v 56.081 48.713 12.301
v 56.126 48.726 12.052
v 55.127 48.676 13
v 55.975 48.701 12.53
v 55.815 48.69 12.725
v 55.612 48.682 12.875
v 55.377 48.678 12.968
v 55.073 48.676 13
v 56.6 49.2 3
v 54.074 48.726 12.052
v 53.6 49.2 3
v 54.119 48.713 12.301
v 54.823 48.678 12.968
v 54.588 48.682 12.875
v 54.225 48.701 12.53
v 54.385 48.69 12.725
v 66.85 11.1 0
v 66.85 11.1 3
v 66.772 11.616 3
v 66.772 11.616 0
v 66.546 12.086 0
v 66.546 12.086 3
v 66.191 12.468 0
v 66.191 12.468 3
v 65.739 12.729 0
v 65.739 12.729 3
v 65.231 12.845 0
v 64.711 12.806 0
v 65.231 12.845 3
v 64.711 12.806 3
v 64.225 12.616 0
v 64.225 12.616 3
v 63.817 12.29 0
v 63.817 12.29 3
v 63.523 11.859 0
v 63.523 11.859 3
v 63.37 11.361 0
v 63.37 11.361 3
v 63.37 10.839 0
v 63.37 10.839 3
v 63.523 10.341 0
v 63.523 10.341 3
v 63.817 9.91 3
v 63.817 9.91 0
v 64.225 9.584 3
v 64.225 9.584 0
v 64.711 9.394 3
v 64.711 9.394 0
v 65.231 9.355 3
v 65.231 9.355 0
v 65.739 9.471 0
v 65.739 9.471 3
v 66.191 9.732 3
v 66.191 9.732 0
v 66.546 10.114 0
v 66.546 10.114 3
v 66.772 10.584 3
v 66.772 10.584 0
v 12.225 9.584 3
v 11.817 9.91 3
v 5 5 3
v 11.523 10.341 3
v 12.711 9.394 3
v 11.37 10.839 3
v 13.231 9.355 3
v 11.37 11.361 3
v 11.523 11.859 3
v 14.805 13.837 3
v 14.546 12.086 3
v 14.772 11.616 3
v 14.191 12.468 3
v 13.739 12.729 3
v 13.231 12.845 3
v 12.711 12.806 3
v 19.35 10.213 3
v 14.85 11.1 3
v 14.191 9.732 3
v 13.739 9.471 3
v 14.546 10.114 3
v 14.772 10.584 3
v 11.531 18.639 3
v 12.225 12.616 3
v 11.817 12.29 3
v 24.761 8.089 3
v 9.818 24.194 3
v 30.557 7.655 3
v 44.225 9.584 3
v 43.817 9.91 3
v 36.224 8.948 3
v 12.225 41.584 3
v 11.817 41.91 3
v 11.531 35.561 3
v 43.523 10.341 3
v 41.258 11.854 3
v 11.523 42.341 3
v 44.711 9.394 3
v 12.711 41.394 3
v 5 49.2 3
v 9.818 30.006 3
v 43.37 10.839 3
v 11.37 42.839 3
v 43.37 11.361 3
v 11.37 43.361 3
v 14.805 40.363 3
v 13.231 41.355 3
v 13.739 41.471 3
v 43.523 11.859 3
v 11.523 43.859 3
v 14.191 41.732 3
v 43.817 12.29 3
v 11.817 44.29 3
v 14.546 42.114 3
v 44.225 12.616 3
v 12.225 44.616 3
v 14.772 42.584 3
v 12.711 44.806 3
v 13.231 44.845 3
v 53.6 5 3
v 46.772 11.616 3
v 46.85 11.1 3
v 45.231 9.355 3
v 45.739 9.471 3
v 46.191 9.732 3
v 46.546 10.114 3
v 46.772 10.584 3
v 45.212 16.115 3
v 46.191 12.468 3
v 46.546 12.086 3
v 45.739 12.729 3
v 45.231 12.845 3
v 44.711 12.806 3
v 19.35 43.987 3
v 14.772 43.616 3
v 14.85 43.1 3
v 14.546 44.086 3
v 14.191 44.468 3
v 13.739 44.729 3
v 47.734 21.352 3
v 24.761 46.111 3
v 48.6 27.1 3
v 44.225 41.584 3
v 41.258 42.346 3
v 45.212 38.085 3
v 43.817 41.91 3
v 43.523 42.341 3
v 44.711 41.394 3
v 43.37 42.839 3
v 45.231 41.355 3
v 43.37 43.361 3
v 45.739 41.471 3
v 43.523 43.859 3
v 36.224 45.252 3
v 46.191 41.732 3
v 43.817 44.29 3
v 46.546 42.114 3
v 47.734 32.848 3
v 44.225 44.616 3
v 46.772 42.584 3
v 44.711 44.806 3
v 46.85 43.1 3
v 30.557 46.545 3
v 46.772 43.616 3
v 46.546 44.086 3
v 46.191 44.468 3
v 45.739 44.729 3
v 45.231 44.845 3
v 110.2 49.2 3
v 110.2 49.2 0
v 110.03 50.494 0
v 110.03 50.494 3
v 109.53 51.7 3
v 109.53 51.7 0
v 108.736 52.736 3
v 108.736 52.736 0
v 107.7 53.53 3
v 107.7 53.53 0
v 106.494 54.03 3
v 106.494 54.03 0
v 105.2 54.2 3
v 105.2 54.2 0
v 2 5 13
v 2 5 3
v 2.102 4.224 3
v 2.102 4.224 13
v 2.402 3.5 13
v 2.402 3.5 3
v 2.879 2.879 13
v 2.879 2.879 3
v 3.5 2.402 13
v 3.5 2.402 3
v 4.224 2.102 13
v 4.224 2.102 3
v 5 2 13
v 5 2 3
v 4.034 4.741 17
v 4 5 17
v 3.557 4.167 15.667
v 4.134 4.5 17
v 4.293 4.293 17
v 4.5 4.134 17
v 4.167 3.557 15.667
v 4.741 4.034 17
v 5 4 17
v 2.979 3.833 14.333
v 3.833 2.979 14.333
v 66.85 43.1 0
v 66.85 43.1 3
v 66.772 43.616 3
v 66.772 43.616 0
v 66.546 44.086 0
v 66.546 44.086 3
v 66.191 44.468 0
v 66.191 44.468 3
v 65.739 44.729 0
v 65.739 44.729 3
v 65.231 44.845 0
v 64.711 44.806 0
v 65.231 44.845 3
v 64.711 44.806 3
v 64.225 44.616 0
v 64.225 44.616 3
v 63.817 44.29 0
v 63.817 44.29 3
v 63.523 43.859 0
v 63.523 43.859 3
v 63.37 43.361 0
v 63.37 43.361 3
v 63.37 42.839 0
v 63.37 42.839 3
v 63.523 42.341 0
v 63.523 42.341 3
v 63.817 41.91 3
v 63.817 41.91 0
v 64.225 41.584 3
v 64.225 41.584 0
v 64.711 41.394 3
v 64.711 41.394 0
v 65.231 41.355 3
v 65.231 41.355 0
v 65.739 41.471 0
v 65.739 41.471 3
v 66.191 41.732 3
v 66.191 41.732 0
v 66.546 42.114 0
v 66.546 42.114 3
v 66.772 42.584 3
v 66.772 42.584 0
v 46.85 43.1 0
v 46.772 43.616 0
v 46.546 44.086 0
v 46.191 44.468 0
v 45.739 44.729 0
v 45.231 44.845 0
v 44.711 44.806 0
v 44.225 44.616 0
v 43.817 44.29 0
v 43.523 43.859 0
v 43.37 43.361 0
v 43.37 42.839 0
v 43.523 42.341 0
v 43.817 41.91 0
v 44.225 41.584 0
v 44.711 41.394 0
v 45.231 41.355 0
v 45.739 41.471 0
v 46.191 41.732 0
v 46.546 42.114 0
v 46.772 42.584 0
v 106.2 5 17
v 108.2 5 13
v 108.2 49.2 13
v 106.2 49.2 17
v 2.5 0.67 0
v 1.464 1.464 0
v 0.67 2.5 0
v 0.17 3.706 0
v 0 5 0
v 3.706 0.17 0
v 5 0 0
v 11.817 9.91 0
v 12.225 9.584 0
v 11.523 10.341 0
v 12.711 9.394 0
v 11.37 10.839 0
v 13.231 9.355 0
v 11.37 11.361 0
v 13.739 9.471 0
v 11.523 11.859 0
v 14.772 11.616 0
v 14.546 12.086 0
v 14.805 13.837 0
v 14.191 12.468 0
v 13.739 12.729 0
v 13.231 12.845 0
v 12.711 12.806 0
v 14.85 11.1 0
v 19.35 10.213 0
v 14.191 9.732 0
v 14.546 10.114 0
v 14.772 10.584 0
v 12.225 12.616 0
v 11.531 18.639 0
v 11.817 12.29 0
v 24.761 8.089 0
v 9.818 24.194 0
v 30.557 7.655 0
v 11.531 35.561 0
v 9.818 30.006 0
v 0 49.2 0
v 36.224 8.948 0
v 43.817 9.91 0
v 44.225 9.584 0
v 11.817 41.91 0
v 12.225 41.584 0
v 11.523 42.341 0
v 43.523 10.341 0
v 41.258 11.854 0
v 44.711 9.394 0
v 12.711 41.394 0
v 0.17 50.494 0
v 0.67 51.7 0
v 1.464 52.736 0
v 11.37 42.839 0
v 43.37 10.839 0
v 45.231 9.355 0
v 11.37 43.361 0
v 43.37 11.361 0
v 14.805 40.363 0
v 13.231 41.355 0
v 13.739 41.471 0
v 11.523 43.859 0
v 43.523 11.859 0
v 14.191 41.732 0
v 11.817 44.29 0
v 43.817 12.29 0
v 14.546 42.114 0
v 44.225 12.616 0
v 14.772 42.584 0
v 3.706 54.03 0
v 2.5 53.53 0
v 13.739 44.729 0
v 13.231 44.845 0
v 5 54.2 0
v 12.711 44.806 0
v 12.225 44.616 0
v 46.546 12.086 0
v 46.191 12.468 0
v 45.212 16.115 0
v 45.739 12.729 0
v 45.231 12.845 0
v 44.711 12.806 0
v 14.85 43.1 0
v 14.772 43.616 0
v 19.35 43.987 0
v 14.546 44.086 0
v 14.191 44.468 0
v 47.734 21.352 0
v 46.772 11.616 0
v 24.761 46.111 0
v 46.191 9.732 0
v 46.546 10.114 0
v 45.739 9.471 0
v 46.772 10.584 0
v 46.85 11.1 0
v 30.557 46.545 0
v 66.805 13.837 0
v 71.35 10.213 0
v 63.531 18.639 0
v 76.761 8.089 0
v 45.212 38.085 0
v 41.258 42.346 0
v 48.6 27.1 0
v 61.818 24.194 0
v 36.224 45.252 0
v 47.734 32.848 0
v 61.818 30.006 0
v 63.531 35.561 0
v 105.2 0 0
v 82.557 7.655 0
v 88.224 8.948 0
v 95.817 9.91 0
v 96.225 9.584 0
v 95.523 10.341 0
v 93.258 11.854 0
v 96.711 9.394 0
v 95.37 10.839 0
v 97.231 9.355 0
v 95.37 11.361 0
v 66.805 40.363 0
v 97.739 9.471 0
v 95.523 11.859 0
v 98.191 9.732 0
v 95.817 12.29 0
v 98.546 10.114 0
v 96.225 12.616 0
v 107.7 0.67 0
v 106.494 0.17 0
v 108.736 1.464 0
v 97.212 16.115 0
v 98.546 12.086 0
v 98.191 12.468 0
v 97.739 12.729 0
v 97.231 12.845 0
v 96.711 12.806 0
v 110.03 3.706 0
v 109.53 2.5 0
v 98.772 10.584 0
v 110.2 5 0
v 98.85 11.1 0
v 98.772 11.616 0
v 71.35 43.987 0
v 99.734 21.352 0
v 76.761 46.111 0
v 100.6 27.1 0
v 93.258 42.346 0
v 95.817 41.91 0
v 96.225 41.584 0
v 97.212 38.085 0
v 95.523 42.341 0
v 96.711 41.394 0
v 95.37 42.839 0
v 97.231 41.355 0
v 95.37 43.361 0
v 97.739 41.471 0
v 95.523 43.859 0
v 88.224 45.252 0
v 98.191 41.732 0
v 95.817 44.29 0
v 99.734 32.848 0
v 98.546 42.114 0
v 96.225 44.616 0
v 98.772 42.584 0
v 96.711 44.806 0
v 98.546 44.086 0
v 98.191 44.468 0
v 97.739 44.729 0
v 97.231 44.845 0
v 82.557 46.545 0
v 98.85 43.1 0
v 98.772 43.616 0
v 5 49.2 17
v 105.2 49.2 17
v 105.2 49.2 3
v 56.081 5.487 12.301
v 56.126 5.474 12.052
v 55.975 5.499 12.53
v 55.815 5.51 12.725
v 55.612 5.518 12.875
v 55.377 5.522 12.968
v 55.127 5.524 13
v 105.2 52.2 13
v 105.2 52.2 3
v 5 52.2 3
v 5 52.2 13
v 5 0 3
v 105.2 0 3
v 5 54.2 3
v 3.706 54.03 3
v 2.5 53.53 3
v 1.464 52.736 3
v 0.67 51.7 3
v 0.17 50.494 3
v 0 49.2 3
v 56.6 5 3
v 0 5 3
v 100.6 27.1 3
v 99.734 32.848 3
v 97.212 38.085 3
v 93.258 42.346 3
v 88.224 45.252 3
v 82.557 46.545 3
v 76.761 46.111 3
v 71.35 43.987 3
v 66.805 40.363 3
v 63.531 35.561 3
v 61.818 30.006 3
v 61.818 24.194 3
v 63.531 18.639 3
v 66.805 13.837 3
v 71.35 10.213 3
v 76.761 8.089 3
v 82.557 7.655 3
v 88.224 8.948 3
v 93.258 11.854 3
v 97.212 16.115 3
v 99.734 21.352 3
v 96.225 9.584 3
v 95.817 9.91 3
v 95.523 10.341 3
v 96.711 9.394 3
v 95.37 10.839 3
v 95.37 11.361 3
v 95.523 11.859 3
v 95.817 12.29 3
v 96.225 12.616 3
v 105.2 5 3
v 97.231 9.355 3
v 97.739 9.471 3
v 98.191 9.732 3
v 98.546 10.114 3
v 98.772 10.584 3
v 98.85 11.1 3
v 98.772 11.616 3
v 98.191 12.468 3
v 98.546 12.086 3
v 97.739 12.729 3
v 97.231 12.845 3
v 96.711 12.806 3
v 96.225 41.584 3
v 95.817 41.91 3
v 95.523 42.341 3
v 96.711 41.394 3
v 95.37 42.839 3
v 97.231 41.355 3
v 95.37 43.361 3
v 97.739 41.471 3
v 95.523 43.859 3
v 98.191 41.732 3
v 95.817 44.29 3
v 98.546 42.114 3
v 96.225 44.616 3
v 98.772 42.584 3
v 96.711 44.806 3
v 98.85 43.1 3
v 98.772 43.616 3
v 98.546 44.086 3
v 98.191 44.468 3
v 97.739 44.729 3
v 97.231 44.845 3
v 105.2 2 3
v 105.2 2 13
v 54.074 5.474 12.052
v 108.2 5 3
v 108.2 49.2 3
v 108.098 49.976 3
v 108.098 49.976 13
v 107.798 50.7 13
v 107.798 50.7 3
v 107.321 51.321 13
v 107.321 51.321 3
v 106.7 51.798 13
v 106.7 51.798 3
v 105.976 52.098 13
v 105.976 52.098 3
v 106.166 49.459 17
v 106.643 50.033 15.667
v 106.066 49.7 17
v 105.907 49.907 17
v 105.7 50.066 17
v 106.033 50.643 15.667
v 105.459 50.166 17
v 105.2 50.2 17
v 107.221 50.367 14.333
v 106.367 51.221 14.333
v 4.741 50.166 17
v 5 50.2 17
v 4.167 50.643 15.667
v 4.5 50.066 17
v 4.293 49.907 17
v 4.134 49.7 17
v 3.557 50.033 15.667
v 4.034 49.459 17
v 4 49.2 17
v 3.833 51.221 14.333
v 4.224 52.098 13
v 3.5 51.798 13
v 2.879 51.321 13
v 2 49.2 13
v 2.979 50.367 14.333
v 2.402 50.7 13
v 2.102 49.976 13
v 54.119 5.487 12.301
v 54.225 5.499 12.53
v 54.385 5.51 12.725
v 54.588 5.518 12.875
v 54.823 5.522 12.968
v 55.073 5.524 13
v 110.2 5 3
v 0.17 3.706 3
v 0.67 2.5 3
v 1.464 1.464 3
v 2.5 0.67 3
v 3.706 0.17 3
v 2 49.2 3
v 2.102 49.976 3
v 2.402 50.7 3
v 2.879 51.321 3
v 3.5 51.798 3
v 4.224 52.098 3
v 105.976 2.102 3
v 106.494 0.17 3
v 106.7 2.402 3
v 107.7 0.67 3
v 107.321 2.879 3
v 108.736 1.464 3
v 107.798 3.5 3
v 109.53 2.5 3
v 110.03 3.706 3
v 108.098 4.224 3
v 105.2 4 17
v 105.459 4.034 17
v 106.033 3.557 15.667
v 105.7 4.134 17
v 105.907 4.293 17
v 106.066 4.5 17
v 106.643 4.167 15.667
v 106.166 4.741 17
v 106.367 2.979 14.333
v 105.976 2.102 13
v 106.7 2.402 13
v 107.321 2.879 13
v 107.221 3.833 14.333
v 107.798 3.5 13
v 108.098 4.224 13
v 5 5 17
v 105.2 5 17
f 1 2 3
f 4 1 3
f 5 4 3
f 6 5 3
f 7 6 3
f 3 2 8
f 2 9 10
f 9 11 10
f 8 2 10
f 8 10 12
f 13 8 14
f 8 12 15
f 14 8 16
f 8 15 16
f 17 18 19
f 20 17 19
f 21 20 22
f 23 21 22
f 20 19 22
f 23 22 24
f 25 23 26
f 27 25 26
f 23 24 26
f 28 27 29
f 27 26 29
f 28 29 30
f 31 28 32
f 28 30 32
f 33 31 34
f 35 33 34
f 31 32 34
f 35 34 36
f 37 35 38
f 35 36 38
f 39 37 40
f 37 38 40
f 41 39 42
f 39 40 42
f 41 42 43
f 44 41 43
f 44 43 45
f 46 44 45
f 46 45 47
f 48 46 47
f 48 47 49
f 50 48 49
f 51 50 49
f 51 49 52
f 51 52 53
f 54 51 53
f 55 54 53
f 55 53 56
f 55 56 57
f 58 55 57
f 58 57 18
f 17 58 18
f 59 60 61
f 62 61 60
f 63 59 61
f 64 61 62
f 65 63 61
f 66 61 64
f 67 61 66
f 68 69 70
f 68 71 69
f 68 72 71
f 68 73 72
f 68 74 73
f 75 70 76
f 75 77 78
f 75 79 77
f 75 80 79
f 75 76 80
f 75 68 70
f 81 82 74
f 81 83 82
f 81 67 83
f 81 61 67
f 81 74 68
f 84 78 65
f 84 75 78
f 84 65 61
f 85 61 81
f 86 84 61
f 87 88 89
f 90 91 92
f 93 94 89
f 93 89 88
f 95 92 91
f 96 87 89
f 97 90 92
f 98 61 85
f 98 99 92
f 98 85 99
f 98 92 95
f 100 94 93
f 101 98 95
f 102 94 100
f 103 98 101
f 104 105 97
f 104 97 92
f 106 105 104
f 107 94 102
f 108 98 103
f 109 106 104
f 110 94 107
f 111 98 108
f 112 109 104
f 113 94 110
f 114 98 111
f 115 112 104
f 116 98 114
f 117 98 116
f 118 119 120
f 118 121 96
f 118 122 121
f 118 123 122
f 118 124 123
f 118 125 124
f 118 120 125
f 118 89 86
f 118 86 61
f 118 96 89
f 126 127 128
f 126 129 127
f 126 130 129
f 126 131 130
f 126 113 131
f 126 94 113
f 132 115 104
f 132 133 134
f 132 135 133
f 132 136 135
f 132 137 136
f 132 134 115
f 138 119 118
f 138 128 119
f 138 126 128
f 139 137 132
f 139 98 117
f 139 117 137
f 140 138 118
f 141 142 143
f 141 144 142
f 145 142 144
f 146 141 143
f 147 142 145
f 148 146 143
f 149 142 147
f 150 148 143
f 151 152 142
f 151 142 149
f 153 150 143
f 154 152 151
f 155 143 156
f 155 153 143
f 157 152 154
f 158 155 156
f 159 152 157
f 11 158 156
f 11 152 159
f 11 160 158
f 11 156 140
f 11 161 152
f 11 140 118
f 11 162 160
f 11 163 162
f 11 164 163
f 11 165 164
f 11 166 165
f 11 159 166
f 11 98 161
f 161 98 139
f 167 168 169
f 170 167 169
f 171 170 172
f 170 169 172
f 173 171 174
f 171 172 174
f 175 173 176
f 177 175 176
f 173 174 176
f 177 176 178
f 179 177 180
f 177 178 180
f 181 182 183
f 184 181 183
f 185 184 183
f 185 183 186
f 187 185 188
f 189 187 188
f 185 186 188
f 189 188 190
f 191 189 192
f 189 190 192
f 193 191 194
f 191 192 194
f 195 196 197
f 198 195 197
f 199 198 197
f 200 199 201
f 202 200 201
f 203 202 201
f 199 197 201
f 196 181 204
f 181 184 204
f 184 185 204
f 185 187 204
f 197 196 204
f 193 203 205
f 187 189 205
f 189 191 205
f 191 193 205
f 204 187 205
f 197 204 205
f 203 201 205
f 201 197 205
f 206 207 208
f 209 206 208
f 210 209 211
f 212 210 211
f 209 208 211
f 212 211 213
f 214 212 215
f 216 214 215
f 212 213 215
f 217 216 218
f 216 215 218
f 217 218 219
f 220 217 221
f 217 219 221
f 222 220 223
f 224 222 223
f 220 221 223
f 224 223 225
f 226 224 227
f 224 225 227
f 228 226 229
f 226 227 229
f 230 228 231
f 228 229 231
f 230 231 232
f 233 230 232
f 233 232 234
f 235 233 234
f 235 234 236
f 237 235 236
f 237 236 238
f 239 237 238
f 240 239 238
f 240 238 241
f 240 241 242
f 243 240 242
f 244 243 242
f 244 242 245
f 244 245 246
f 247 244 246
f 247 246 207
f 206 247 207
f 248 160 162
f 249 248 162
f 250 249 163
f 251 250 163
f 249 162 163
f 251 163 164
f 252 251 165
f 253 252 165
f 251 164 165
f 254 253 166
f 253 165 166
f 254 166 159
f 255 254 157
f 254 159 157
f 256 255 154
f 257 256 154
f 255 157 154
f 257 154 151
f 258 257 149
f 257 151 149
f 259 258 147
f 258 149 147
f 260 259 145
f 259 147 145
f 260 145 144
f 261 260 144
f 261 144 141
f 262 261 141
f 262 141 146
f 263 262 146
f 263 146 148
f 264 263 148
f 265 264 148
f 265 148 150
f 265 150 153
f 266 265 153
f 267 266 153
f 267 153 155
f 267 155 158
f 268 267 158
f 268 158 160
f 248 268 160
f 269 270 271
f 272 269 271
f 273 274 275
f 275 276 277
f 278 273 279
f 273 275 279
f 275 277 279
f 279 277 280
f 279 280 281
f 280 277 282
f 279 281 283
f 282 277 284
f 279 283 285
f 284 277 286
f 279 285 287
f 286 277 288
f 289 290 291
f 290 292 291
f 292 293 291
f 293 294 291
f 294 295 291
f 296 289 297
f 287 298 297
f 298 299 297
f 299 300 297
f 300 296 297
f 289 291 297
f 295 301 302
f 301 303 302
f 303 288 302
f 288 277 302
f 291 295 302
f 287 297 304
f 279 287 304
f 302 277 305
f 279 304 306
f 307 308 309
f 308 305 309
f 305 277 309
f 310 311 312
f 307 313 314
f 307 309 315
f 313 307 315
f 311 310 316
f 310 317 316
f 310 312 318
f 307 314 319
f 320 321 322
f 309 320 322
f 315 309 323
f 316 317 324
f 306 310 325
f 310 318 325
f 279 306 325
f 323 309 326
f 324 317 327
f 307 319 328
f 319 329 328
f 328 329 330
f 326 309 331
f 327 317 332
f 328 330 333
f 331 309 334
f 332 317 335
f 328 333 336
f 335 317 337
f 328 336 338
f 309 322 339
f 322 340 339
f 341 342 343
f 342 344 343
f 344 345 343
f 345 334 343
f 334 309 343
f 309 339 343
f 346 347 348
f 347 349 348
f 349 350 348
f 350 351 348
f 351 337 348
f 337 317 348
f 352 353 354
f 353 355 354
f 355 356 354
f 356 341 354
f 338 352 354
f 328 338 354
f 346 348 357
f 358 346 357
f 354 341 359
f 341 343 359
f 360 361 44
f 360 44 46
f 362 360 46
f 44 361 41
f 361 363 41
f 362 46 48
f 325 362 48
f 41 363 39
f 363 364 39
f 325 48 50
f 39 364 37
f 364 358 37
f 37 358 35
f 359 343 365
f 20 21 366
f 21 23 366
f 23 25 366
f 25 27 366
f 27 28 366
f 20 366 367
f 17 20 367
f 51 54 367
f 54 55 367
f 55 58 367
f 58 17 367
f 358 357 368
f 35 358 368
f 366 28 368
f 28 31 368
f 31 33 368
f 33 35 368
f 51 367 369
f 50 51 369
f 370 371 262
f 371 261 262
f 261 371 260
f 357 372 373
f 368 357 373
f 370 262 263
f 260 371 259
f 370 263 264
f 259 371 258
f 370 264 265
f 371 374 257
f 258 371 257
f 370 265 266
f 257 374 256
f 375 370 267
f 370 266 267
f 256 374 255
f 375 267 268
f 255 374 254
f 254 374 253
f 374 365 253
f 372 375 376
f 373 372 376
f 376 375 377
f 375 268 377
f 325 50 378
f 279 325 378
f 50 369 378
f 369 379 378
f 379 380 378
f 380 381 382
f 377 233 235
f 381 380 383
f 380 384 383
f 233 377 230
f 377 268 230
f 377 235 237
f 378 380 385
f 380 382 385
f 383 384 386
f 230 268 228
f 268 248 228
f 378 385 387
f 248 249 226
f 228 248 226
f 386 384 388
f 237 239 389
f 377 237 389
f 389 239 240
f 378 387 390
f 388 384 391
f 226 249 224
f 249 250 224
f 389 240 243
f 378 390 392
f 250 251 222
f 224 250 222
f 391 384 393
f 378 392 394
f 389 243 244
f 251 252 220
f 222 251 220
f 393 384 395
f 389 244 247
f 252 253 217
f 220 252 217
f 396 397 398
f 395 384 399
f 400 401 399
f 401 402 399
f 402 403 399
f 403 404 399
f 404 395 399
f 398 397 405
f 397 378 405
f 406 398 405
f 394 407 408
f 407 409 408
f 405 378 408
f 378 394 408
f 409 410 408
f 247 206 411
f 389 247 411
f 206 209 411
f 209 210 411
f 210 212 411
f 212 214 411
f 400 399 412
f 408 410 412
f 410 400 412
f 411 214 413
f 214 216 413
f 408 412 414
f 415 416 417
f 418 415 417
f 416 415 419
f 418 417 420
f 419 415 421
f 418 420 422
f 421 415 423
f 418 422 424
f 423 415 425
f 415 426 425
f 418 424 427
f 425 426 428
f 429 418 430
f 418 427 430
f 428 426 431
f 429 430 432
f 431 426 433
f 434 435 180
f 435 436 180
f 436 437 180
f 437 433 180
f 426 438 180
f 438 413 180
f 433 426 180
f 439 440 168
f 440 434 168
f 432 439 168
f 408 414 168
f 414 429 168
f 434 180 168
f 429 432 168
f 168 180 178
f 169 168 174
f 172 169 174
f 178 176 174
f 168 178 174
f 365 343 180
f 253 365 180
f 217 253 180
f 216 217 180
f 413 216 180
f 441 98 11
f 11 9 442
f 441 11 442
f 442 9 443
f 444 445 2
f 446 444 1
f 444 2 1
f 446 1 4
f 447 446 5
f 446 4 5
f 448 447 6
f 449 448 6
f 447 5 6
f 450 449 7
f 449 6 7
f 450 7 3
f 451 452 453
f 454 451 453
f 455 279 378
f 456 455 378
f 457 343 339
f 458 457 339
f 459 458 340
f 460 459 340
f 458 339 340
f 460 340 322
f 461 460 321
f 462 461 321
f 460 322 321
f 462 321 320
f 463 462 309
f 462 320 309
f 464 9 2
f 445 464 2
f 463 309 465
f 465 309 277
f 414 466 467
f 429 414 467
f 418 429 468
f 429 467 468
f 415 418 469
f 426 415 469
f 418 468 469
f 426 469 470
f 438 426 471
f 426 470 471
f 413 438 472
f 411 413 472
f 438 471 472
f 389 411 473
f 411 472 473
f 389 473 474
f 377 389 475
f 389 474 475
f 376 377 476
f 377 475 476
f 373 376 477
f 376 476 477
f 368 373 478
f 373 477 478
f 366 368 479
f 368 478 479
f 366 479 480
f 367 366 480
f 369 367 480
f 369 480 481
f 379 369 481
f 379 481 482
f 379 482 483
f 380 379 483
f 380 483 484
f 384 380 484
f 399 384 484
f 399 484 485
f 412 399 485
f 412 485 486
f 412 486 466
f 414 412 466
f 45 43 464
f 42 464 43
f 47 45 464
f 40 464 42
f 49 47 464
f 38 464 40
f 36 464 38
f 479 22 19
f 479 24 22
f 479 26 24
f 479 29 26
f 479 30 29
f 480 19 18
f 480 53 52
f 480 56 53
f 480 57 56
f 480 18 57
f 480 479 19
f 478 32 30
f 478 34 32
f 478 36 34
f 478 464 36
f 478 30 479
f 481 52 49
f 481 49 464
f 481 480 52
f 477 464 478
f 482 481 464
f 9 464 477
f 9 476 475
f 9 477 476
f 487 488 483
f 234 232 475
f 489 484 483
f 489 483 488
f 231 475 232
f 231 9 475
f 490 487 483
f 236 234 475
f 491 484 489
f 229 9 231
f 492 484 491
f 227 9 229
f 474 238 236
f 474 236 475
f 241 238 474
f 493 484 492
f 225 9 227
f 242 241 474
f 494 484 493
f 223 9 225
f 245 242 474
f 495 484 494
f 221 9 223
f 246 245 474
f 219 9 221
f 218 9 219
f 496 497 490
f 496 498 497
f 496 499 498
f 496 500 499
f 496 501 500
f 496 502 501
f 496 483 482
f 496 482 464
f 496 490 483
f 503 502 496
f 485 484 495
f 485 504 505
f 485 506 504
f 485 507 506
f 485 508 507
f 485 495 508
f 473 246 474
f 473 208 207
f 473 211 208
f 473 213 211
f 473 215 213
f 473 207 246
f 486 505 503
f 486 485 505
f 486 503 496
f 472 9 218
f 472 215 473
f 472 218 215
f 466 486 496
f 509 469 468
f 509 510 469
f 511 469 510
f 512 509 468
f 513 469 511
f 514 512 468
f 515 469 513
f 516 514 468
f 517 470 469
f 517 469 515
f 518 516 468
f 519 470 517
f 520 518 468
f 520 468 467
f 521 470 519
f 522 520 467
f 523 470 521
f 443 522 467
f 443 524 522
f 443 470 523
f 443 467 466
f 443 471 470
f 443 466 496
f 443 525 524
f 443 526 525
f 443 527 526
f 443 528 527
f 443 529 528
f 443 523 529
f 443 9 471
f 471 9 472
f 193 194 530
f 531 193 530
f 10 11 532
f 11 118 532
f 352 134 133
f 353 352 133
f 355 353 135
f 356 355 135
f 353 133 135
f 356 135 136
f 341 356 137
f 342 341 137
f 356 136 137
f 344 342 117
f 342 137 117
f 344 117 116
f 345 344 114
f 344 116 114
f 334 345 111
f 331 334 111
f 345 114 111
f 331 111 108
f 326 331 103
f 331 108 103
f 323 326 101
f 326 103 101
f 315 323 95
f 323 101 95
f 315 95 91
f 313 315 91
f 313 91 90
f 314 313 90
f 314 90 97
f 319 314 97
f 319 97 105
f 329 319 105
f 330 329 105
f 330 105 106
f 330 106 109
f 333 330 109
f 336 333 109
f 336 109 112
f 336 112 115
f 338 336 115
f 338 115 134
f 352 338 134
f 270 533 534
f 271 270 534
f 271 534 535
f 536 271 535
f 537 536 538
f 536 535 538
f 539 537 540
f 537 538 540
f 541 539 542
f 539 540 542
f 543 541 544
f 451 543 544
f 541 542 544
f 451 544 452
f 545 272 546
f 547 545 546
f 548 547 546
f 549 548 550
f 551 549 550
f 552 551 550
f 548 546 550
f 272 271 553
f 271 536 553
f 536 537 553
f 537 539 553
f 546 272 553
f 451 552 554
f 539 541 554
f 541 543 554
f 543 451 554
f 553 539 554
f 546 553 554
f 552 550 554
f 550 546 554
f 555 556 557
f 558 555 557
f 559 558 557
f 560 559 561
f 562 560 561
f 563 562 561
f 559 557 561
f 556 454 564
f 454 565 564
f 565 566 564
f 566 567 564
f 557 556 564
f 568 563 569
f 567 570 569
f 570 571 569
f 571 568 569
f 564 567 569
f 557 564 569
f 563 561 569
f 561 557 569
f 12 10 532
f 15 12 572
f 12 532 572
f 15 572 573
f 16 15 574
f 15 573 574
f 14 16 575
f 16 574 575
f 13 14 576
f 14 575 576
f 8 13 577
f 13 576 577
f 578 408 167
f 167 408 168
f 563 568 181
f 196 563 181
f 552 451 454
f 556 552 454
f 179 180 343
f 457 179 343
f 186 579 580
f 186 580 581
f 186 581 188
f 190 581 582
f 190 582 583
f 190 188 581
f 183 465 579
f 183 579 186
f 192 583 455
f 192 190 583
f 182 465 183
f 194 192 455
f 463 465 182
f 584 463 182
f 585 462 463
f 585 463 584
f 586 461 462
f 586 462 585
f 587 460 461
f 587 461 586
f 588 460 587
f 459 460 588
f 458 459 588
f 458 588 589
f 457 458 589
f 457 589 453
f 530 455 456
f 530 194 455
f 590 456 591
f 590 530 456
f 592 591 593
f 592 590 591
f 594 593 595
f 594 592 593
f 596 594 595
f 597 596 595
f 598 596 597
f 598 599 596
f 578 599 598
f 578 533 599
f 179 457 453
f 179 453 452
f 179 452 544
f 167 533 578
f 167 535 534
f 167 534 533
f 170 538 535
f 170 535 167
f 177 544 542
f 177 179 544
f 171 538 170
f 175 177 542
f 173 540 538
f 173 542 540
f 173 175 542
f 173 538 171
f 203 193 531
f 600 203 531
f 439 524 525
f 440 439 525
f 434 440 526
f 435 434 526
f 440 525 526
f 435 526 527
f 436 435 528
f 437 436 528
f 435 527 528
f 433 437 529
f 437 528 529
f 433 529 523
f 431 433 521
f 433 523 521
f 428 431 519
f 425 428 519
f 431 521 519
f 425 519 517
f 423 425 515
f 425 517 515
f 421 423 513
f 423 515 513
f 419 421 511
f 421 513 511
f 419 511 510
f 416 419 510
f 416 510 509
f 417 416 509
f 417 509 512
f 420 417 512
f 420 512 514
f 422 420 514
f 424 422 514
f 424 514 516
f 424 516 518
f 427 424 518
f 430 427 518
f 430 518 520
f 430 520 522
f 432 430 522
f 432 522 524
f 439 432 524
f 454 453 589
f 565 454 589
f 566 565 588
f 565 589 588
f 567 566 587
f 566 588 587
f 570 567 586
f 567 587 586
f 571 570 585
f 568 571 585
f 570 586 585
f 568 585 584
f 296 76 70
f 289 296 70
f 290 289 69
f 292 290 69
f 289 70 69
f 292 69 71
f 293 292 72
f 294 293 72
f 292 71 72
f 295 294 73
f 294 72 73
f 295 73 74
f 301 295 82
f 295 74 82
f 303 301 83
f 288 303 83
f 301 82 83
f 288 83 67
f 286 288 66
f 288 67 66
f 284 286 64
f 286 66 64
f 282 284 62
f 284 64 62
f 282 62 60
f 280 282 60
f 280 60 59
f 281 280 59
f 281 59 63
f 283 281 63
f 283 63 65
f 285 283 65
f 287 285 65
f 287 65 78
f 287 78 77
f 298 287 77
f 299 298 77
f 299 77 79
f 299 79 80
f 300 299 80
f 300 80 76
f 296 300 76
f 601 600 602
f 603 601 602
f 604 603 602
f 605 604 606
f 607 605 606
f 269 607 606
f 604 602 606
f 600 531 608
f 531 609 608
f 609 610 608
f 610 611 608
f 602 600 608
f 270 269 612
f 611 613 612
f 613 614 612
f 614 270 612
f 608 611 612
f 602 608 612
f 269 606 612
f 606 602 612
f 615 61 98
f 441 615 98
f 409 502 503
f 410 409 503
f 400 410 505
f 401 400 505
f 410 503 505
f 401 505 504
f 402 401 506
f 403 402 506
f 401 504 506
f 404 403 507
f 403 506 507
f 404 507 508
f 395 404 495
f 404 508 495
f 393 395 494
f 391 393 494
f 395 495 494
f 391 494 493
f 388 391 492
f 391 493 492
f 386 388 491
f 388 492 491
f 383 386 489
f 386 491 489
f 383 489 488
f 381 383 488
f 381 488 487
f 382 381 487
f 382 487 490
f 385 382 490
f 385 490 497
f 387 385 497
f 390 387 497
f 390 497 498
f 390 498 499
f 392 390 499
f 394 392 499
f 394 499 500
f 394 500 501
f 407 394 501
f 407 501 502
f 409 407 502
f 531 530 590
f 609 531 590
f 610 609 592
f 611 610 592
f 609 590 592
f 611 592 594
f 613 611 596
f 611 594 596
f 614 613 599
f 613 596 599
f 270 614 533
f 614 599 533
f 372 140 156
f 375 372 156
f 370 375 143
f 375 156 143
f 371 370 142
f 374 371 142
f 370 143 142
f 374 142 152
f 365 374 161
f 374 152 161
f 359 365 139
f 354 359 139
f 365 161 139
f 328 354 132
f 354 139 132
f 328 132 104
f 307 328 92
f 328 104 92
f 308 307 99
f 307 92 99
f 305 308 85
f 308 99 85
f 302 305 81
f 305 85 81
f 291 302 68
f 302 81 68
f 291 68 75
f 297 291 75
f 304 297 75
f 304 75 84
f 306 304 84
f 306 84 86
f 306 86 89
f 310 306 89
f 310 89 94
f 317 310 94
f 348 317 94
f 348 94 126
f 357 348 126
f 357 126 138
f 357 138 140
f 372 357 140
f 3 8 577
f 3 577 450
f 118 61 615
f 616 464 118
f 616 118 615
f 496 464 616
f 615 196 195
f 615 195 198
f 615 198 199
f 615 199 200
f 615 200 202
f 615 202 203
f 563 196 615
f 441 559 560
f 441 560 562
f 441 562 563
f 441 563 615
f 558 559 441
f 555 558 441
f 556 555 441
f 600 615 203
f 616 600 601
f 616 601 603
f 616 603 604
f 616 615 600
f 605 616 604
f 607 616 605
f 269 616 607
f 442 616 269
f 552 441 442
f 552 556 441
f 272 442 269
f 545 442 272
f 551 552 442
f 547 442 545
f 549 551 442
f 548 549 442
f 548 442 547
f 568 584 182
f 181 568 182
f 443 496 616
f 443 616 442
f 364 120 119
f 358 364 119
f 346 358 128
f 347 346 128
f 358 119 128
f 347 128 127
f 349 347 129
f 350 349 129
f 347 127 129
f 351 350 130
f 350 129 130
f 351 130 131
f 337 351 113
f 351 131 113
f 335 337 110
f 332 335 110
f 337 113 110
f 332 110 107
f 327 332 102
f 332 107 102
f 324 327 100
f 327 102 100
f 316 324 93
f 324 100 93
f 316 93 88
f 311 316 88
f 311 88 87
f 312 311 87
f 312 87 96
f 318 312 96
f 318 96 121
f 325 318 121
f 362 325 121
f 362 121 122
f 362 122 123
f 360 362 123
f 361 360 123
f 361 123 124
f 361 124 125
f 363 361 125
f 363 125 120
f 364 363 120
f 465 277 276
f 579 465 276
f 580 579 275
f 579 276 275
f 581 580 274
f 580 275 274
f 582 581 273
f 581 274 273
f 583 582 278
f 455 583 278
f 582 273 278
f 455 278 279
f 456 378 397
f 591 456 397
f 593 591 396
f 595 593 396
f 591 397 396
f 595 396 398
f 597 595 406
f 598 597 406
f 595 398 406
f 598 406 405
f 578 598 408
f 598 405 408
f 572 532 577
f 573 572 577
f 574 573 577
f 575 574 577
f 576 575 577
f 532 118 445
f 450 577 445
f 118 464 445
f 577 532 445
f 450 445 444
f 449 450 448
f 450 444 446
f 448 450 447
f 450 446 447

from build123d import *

# Parameters (mm, degrees)
F1_DEPTH = 3
F2_W     = 100.2
F2_H     = 44.2
F3_DEPTH = 14
F4_SIZE2 = 4
F4_SIZE  = 2
F5_R     = 19.5
F5_R_2   = 1.75
F6_DEPTH = 3.001
F7_W     = 3
F7_H     = 44.2
F8_DEPTH = 10
F8_TAPER = 3
F9_R     = 1


with BuildPart() as f1:
    # F0 (on Top) → F1 (new body)
    with BuildSketch(Plane.XY):
        with BuildLine():
            ThreePointArc((0, 5), (1.4644660941, 1.4644660941), (5, 0))
            Line((5, 0), (105.2, 0))
            ThreePointArc((105.2, 0), (108.7355339059, 1.4644660941), (110.2, 5))
            Line((110.2, 5), (110.2, 49.2))
            ThreePointArc((110.2, 49.2), (108.7355339059, 52.7355339059), (105.2, 54.2))
            Line((105.2, 54.2), (5, 54.2))
            ThreePointArc((5, 54.2), (1.4644660941, 52.7355339059), (0, 49.2))
            Line((0, 49.2), (0, 5))
        make_face()
    extrude(amount=F1_DEPTH)

    # F2 (on face) → F3 (join)
    with BuildSketch(Plane.XY.offset(3)):
        with BuildLine():
            ThreePointArc((2, 5), (2.8786796564, 2.8786796564), (5, 2))
            Line((5, 2), (105.2, 2))
            ThreePointArc((105.2, 2), (107.3213203436, 2.8786796564), (108.2, 5))
            Line((108.2, 5), (108.2, 49.2))
            ThreePointArc((108.2, 49.2), (107.3213203436, 51.3213203436), (105.2, 52.2))
            Line((105.2, 52.2), (5, 52.2))
            ThreePointArc((5, 52.2), (2.8786796564, 51.3213203436), (2, 49.2))
            Line((2, 49.2), (2, 5))
        make_face()
        with Locations((55.1, 27.1)):
            Rectangle(F2_W, F2_H, mode=Mode.SUBTRACT)
    extrude(amount=F3_DEPTH)

    # F4
    f4_edges = [f1.edges().sort_by_distance(p)[0] for p in [
        (55.1, 2, 17),
    ]]
    f4_side = f1.faces().sort_by_distance((3.709296, 3.709296, 17))[0]
    chamfer(f4_edges, length=F4_SIZE, length2=F4_SIZE2, reference=f4_side)

    # F5 (on face) → F6 (cut, through all)
    with BuildSketch(Plane.XY.offset(3)):
        with Locations((29.1, 27.1)):
            Circle(F5_R)
        with Locations((13.1, 43.1)):
            Circle(F5_R_2)
        with Locations((13.1, 11.1)):
            Circle(F5_R_2)
        with Locations((45.1, 11.1)):
            Circle(F5_R_2)
        with Locations((45.1, 43.1)):
            Circle(F5_R_2)
        with Locations((81.1, 27.1)):
            Circle(F5_R)
        with Locations((65.1, 43.1)):
            Circle(F5_R_2)
        with Locations((65.1, 11.1)):
            Circle(F5_R_2)
        with Locations((97.1, 11.1)):
            Circle(F5_R_2)
        with Locations((97.1, 43.1)):
            Circle(F5_R_2)
    extrude(amount=-F6_DEPTH, mode=Mode.SUBTRACT)

    # F7 (on face) → F8 (join)
    with BuildSketch(Plane.XY.offset(3)):
        with Locations((55.1, 27.1)):
            Rectangle(F7_W, F7_H)
    extrude(amount=F8_DEPTH, taper=F8_TAPER)

    # F9
    f9_edges = [f1.edges().sort_by_distance(p)[0] for p in [
        (56.075922, 27.1, 13),
        (54.124078, 27.1, 13),
    ]]
    fillet(f9_edges, radius=F9_R)


solid = f1.part
